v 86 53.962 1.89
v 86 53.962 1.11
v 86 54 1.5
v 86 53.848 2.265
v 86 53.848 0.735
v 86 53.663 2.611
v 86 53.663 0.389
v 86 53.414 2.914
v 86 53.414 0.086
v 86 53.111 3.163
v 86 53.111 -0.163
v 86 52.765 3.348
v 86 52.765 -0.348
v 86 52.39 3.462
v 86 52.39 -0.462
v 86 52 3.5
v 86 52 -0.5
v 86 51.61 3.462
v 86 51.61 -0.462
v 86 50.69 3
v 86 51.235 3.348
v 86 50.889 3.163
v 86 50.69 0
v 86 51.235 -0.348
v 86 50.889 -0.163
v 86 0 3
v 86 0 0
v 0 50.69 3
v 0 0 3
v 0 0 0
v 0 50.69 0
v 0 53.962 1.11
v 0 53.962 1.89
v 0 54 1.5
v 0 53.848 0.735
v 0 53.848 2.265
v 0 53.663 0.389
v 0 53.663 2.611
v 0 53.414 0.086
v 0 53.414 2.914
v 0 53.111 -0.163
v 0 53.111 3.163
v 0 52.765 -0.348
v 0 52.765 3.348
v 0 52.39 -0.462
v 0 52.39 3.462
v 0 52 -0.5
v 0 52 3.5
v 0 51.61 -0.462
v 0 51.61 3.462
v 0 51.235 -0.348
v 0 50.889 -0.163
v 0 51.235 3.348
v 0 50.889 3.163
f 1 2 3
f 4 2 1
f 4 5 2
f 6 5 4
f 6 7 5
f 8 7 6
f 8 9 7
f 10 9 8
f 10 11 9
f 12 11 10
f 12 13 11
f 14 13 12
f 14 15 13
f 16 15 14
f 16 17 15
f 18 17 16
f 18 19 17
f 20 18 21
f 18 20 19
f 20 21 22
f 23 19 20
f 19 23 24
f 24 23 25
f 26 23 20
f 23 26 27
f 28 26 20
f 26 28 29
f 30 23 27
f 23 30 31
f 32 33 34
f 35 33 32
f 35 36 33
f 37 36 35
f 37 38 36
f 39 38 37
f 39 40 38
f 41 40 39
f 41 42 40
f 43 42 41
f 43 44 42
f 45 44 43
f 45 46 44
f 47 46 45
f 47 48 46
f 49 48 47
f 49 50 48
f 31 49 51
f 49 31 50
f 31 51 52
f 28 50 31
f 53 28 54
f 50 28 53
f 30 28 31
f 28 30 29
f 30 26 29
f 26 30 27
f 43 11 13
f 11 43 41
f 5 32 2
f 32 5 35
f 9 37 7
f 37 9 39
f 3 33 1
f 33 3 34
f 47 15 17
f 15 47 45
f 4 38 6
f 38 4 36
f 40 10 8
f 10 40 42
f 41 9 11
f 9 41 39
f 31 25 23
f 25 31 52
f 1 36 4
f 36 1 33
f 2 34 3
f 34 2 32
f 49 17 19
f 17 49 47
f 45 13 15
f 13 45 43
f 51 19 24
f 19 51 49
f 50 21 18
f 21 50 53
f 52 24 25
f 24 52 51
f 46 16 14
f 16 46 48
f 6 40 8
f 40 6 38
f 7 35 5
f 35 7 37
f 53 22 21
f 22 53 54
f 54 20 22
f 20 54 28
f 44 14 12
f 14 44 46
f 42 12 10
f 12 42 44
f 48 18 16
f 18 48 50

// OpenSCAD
// Concept only. Provisional dimensions in mm.
$fn=32;
cube([86,52,3]);translate([0,52,1.5])rotate([0,90,0])cylinder(h=86,r=2);
